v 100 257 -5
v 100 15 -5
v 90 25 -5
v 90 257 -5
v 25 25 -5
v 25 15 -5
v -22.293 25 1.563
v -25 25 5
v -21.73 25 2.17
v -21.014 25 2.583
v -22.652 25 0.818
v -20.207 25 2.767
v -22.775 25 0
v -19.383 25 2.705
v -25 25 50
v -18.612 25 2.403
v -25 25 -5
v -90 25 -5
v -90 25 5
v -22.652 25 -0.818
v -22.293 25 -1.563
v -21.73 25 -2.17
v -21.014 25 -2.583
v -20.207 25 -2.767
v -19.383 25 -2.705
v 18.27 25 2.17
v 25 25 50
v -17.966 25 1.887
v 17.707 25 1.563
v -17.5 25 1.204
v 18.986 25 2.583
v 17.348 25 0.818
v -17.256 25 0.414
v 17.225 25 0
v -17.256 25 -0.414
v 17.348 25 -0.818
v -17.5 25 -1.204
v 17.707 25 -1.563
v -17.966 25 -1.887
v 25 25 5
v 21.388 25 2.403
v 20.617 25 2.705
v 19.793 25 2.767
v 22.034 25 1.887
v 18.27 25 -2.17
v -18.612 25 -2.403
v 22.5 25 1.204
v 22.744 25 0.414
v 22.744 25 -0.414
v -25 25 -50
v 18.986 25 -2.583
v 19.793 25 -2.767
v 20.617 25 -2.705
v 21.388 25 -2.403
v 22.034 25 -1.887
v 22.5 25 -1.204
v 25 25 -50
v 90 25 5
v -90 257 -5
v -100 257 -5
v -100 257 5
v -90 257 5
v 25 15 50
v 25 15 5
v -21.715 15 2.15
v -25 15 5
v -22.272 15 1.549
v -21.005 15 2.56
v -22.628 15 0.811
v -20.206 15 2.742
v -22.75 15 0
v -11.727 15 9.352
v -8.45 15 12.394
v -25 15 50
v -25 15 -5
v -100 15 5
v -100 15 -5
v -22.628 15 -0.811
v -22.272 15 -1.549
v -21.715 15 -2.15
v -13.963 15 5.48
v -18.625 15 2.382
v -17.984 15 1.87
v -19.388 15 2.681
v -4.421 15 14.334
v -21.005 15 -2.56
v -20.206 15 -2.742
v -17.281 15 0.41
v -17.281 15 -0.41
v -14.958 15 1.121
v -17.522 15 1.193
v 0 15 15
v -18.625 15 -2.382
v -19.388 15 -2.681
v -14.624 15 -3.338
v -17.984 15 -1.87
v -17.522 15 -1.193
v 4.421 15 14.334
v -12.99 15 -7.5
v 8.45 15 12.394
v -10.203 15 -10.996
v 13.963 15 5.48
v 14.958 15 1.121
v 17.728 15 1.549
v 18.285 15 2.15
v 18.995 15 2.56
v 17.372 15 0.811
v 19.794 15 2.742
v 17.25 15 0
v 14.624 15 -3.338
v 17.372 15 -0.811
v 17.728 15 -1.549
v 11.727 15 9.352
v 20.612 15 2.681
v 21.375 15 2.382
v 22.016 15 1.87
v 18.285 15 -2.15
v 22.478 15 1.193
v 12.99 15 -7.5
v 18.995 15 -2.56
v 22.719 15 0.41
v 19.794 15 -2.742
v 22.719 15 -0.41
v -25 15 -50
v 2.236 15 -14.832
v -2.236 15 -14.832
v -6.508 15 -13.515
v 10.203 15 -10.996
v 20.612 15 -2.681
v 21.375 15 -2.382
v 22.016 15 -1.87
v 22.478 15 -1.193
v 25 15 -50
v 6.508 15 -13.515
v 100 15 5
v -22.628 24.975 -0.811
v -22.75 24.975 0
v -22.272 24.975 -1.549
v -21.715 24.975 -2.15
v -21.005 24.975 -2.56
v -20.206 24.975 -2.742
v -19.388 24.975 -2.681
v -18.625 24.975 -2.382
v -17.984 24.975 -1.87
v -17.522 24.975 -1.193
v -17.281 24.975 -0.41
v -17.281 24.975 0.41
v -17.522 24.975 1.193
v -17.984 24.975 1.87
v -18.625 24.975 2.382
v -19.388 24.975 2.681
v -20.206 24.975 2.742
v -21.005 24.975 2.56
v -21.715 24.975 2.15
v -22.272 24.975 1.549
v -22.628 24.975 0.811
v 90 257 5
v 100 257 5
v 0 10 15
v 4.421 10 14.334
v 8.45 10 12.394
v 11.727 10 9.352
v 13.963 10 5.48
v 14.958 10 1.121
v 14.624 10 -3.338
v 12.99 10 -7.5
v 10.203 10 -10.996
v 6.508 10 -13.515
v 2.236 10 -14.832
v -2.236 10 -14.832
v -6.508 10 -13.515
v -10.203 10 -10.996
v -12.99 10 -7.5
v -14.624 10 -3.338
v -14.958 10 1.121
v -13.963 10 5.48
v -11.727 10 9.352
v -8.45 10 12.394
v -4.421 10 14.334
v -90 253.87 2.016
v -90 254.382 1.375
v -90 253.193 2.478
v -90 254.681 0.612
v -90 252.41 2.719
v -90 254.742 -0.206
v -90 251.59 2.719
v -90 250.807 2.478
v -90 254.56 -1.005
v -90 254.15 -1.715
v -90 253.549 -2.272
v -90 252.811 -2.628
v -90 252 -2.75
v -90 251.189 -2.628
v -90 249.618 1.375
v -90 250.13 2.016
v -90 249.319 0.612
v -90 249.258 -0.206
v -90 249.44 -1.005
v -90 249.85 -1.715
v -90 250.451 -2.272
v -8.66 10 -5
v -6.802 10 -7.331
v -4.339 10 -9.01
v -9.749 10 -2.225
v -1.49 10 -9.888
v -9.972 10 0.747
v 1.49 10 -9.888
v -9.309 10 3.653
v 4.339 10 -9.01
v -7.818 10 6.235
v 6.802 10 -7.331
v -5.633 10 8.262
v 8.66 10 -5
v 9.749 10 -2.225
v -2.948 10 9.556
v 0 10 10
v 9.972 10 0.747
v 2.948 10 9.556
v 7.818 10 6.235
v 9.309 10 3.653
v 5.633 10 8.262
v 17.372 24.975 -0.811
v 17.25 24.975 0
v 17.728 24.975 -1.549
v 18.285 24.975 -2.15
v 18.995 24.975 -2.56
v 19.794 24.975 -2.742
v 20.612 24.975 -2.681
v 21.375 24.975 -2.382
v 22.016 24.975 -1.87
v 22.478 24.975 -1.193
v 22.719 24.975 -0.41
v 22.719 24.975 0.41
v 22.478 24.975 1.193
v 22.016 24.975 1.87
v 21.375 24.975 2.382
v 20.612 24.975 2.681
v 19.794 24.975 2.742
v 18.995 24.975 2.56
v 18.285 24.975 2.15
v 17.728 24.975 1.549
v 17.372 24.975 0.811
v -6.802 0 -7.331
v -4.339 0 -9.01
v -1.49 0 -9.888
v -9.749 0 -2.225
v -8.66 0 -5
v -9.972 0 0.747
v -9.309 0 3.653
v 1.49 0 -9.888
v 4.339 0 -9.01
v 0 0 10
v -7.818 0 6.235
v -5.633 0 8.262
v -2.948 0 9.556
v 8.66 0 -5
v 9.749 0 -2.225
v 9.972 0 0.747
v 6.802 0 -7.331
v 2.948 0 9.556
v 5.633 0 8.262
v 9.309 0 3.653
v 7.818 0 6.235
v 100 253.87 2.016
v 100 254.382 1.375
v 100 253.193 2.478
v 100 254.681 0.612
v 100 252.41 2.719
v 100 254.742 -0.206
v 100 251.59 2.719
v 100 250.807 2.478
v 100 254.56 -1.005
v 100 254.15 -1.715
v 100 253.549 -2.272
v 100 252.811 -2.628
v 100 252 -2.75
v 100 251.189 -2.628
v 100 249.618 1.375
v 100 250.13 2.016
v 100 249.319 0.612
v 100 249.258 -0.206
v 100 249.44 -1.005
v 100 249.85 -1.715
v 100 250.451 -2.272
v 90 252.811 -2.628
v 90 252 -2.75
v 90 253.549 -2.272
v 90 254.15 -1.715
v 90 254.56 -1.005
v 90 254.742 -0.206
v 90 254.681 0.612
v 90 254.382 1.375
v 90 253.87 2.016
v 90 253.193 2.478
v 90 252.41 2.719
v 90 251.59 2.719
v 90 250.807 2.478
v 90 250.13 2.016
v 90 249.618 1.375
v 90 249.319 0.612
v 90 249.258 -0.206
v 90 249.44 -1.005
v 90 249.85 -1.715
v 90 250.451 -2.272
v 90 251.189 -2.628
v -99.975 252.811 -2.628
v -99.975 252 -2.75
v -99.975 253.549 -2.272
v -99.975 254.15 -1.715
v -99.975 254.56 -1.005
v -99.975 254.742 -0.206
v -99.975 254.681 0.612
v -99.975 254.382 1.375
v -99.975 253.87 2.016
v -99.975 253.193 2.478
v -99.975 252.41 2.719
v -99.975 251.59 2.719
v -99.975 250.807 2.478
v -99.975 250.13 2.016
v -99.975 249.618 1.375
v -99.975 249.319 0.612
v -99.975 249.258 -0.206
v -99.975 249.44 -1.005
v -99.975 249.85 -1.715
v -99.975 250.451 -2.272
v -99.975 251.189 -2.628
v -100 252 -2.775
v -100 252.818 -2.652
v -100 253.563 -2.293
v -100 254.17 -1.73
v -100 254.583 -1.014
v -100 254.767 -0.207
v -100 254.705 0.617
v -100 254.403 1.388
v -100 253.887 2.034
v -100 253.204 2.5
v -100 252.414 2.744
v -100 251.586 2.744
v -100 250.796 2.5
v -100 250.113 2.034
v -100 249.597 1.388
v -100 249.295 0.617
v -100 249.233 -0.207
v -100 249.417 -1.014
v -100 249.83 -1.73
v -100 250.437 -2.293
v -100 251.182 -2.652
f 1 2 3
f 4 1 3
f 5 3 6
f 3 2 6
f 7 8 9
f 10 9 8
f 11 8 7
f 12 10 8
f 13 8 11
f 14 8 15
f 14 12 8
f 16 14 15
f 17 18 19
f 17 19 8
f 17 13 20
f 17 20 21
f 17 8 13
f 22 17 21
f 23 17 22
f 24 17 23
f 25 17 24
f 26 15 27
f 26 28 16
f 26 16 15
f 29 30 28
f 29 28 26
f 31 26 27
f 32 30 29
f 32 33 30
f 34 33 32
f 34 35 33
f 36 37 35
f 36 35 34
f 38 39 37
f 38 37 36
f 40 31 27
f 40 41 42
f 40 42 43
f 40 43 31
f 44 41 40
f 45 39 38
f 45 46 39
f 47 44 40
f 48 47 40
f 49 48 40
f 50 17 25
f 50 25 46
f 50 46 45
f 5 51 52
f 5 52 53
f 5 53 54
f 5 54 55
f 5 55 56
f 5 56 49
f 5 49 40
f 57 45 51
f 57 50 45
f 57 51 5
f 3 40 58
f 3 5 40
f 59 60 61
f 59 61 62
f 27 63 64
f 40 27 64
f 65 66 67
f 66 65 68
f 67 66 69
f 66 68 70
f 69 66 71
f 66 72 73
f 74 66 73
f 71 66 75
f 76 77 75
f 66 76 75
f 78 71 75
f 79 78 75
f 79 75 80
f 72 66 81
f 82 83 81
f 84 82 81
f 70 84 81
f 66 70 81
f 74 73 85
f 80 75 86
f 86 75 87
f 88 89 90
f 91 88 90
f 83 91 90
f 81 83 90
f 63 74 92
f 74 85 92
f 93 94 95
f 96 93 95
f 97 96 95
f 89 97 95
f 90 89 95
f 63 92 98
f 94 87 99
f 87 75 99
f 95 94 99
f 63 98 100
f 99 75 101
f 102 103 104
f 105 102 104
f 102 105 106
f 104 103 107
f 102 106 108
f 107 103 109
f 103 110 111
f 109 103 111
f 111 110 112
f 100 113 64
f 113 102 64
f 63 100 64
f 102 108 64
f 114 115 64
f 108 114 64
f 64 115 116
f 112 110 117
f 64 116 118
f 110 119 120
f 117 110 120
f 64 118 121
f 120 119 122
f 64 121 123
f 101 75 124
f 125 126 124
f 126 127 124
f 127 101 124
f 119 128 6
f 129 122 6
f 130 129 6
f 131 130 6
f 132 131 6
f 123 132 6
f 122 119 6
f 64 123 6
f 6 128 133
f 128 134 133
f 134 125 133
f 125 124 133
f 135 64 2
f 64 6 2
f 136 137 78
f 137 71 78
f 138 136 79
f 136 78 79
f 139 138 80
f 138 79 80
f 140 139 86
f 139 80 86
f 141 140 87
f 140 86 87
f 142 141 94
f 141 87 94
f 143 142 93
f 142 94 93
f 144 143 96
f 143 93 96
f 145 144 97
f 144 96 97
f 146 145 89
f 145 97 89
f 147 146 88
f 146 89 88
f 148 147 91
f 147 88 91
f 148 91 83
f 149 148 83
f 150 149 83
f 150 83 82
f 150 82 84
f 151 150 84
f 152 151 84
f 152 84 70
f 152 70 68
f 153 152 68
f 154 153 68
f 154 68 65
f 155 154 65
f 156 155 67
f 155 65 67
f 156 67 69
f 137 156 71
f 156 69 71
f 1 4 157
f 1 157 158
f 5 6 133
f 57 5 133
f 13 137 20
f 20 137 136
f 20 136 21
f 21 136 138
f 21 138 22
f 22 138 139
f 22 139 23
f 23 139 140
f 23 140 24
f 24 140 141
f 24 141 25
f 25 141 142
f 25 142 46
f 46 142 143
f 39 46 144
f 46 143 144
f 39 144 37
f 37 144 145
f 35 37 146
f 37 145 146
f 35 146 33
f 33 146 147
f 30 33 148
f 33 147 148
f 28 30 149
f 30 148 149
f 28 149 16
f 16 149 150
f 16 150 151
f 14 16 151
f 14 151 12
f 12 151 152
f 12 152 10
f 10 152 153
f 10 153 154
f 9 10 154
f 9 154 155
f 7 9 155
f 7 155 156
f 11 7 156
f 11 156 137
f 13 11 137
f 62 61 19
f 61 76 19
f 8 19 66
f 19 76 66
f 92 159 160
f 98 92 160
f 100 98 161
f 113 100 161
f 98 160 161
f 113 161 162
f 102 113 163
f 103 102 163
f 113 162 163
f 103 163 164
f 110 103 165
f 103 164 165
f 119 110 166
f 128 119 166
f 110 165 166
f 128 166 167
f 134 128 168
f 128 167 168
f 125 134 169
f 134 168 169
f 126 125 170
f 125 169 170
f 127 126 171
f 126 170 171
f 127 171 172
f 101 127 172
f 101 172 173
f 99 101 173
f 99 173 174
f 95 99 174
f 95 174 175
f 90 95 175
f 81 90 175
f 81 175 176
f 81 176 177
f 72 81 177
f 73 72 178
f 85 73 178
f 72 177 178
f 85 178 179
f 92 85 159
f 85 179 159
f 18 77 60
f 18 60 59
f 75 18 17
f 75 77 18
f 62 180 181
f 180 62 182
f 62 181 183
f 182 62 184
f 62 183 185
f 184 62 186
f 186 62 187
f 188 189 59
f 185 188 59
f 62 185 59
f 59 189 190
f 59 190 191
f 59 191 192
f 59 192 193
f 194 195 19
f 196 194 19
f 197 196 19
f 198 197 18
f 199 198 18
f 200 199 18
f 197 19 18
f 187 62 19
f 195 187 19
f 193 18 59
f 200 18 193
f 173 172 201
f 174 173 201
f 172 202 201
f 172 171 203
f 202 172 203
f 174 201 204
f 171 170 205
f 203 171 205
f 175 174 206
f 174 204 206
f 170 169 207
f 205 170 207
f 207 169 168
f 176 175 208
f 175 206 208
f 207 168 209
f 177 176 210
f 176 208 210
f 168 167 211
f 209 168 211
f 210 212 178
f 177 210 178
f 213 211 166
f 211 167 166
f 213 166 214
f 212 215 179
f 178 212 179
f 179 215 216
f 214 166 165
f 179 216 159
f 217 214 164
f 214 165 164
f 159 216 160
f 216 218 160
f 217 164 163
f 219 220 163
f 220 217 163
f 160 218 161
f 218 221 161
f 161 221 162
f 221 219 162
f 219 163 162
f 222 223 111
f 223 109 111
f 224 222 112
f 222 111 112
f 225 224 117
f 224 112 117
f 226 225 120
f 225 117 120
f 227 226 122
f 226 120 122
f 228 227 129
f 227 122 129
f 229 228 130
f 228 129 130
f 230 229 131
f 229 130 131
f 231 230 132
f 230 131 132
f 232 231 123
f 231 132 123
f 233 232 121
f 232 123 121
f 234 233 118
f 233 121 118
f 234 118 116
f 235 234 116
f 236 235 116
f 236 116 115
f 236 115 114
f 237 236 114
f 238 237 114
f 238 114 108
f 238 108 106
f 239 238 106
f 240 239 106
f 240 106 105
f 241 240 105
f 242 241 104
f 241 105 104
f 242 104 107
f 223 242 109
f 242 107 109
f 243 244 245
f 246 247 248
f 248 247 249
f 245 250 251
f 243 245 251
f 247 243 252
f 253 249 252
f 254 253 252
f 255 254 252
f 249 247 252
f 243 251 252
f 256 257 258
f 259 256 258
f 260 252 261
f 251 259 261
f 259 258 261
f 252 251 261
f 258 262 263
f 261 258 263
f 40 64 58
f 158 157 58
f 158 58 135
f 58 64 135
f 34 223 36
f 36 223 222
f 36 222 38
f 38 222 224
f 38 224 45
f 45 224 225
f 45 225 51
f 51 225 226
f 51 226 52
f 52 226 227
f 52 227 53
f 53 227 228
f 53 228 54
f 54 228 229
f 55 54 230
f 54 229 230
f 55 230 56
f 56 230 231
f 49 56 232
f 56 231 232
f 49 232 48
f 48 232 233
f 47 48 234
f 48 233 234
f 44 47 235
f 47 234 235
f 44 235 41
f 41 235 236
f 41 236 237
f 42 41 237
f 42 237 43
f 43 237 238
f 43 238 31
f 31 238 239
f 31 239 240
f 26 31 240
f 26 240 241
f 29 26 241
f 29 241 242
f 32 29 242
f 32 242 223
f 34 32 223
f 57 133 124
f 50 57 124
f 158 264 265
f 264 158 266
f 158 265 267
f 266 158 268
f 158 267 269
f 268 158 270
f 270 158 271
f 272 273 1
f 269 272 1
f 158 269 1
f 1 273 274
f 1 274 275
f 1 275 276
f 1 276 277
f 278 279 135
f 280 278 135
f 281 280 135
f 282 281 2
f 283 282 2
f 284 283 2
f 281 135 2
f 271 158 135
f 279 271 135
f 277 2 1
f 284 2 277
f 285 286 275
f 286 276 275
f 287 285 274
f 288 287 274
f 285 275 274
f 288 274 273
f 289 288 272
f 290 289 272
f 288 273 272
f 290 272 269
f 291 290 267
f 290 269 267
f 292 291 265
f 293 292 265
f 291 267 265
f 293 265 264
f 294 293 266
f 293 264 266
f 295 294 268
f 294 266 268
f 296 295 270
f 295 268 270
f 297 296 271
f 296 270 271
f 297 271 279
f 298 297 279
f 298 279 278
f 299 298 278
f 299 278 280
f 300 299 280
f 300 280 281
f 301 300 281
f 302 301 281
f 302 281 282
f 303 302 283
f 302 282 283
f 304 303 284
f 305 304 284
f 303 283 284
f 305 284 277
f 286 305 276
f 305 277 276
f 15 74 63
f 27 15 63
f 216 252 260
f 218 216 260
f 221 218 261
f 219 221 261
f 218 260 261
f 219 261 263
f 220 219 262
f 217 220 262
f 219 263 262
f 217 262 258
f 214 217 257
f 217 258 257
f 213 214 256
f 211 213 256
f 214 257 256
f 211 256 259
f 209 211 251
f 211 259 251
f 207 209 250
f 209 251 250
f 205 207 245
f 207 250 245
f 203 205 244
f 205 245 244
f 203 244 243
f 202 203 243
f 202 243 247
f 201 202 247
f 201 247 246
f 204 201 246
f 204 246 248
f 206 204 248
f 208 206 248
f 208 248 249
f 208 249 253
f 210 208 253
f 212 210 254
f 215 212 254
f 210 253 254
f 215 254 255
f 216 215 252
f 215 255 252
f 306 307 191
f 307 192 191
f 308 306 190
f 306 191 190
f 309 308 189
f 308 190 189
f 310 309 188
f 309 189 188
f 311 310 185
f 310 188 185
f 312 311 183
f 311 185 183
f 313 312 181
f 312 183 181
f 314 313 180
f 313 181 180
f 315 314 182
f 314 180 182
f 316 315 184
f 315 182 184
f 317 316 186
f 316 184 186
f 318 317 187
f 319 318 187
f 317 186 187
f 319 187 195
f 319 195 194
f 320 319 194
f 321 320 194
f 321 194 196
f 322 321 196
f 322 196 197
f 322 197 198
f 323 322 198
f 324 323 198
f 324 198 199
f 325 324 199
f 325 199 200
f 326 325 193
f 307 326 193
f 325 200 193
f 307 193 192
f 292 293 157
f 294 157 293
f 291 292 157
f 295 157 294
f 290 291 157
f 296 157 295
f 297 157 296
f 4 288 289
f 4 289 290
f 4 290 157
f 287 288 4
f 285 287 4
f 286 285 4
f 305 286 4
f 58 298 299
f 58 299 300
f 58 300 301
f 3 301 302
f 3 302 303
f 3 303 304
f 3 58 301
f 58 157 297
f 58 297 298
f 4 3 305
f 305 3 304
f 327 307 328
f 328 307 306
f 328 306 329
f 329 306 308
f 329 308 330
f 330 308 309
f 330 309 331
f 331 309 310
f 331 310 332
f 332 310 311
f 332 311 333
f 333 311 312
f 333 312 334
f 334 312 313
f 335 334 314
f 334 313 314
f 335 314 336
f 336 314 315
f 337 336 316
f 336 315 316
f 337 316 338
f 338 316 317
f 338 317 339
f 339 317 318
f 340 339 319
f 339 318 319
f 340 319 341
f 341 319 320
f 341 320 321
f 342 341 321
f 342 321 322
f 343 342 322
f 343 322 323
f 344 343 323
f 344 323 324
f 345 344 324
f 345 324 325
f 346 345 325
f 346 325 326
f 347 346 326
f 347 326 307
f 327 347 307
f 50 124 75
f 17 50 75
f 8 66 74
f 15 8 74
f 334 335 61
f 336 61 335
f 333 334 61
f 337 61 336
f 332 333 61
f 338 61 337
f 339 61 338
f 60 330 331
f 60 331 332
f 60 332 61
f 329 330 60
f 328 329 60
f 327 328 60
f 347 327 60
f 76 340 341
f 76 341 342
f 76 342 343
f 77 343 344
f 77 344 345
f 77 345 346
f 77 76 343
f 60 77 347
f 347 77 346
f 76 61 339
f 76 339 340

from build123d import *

# Parameters (mm, degrees)
SKETCH1_R                      = 10
BOSS_EXTRUDE1_DEPTH            = 10
SKETCH4_R                      = 15
BOSS_EXTRUDE4_DEPTH            = 5
BOSS_EXTRUDE2_DEPTH            = 10
SKETCH3_W                      = 10
SKETCH3_H                      = 10
BOSS_EXTRUDE3_DEPTH            = 232
M5_CLEARANCE_HOLE1_D           = 5.5
M5_CLEARANCE_HOLE1_CSINK_D     = 5.55
M5_CLEARANCE_HOLE1_CSINK_ANGLE = 90
M5_CLEARANCE_HOLE2_D           = 5.5
M5_CLEARANCE_HOLE2_CSINK_D     = 5.55
M5_CLEARANCE_HOLE2_CSINK_ANGLE = 90


with BuildPart() as part:
    # Sketch1 → Boss-Extrude1 (new body)
    with BuildSketch(Plane(origin=(0, 0, 0), x_dir=(1, 0, 0), z_dir=(0, 1, 0))):
        with Locations(Location((0, 0, 0), (0, 0, 270))):
            Circle(SKETCH1_R)
    extrude(amount=BOSS_EXTRUDE1_DEPTH)

    # Sketch4 → Boss-Extrude4 (add)
    with BuildSketch(Plane(origin=(0, 10, 0), x_dir=(1, 0, 0), z_dir=(0, 1, 0))):
        with Locations(Location((0, 0, 0), (0, 0, 270))):
            Circle(SKETCH4_R)
    extrude(amount=BOSS_EXTRUDE4_DEPTH)

    # Sketch2 → Boss-Extrude2 (add)
    with BuildSketch(Plane(origin=(0, 15, 0), x_dir=(1, 0, 0), z_dir=(0, 1, 0))):
        with BuildLine():
            Line((-25, 50), (-25, 5))
            Line((-25, 5), (-14.142135624, 5))
            ThreePointArc((-14.142135624, 5), (0, 15), (14.142135624, 5))
            Line((14.142135624, 5), (25, 5))
            Line((25, 5), (25, 50))
            Line((25, 50), (-25, 50))
        make_face()
        with BuildLine():
            Line((-14.142135624, 5), (-25, 5))
            Line((-25, 5), (-100, 5))
            Line((-100, 5), (-100, -5))
            Line((-100, -5), (-25, -5))
            Line((-25, -5), (-14.142135624, -5))
            ThreePointArc((-14.142135624, -5), (-15, 0), (-14.142135624, 5))
        make_face()
        with BuildLine():
            ThreePointArc((14.142135624, -5), (0, -15), (-14.142135624, -5))
            Line((-14.142135624, -5), (-25, -5))
            Line((-25, -5), (-25, -50))
            Line((-25, -50), (25, -50))
            Line((25, -50), (25, -5))
            Line((25, -5), (14.142135624, -5))
        make_face()
        with BuildLine():
            Line((25, 5), (14.142135624, 5))
            ThreePointArc((14.142135624, 5), (14.783978395, 2.536529681), (15, 0))
            ThreePointArc((15, 0), (14.783978395, -2.536529681), (14.142135624, -5))
            Line((14.142135624, -5), (25, -5))
            Line((25, -5), (100, -5))
            Line((100, -5), (100, 5))
            Line((100, 5), (25, 5))
        make_face()
        with BuildLine():
            Line((14.142135624, 5), (-14.142135624, 5))
            ThreePointArc((-14.142135624, 5), (-15, 0), (-14.142135624, -5))
            Line((-14.142135624, -5), (14.142135624, -5))
            ThreePointArc((14.142135624, -5), (14.783978395, -2.536529681), (15, 0))
            ThreePointArc((15, 0), (14.783978395, 2.536529681), (14.142135624, 5))
        make_face()
        with BuildLine():
            ThreePointArc((14.142135624, 5), (0, 15), (-14.142135624, 5))
            Line((-14.142135624, 5), (14.142135624, 5))
        make_face()
        with BuildLine():
            Line((14.142135624, -5), (-14.142135624, -5))
            ThreePointArc((-14.142135624, -5), (0, -15), (14.142135624, -5))
        make_face()
    extrude(amount=BOSS_EXTRUDE2_DEPTH)

    # Sketch3 → Boss-Extrude3 (add)
    with BuildSketch(Plane(origin=(0, 25, 0), x_dir=(1, 0, 0), z_dir=(0, 1, 0))):
        with Locations((-95, 0)):
            Rectangle(SKETCH3_W, SKETCH3_H)
        with Locations((95, 0)):
            Rectangle(SKETCH3_W, SKETCH3_H)
    extrude(amount=BOSS_EXTRUDE3_DEPTH)

    # M5 Clearance Hole1 (through all)
    with Locations(Plane.ZY.offset(100)):
        with Locations((0, 252)):
            CounterSinkHole(M5_CLEARANCE_HOLE1_D / 2, M5_CLEARANCE_HOLE1_CSINK_D / 2, counter_sink_angle=M5_CLEARANCE_HOLE1_CSINK_ANGLE)

    # M5 Clearance Hole2 (through all)
    with Locations(Plane(origin=(0, 25, 0), x_dir=(1, 0, 0), z_dir=(0, 1, 0))):
        with Locations((-20, 0), (20, 0)):
            CounterSinkHole(M5_CLEARANCE_HOLE2_D / 2, M5_CLEARANCE_HOLE2_CSINK_D / 2, counter_sink_angle=M5_CLEARANCE_HOLE2_CSINK_ANGLE)


solid = part.part
